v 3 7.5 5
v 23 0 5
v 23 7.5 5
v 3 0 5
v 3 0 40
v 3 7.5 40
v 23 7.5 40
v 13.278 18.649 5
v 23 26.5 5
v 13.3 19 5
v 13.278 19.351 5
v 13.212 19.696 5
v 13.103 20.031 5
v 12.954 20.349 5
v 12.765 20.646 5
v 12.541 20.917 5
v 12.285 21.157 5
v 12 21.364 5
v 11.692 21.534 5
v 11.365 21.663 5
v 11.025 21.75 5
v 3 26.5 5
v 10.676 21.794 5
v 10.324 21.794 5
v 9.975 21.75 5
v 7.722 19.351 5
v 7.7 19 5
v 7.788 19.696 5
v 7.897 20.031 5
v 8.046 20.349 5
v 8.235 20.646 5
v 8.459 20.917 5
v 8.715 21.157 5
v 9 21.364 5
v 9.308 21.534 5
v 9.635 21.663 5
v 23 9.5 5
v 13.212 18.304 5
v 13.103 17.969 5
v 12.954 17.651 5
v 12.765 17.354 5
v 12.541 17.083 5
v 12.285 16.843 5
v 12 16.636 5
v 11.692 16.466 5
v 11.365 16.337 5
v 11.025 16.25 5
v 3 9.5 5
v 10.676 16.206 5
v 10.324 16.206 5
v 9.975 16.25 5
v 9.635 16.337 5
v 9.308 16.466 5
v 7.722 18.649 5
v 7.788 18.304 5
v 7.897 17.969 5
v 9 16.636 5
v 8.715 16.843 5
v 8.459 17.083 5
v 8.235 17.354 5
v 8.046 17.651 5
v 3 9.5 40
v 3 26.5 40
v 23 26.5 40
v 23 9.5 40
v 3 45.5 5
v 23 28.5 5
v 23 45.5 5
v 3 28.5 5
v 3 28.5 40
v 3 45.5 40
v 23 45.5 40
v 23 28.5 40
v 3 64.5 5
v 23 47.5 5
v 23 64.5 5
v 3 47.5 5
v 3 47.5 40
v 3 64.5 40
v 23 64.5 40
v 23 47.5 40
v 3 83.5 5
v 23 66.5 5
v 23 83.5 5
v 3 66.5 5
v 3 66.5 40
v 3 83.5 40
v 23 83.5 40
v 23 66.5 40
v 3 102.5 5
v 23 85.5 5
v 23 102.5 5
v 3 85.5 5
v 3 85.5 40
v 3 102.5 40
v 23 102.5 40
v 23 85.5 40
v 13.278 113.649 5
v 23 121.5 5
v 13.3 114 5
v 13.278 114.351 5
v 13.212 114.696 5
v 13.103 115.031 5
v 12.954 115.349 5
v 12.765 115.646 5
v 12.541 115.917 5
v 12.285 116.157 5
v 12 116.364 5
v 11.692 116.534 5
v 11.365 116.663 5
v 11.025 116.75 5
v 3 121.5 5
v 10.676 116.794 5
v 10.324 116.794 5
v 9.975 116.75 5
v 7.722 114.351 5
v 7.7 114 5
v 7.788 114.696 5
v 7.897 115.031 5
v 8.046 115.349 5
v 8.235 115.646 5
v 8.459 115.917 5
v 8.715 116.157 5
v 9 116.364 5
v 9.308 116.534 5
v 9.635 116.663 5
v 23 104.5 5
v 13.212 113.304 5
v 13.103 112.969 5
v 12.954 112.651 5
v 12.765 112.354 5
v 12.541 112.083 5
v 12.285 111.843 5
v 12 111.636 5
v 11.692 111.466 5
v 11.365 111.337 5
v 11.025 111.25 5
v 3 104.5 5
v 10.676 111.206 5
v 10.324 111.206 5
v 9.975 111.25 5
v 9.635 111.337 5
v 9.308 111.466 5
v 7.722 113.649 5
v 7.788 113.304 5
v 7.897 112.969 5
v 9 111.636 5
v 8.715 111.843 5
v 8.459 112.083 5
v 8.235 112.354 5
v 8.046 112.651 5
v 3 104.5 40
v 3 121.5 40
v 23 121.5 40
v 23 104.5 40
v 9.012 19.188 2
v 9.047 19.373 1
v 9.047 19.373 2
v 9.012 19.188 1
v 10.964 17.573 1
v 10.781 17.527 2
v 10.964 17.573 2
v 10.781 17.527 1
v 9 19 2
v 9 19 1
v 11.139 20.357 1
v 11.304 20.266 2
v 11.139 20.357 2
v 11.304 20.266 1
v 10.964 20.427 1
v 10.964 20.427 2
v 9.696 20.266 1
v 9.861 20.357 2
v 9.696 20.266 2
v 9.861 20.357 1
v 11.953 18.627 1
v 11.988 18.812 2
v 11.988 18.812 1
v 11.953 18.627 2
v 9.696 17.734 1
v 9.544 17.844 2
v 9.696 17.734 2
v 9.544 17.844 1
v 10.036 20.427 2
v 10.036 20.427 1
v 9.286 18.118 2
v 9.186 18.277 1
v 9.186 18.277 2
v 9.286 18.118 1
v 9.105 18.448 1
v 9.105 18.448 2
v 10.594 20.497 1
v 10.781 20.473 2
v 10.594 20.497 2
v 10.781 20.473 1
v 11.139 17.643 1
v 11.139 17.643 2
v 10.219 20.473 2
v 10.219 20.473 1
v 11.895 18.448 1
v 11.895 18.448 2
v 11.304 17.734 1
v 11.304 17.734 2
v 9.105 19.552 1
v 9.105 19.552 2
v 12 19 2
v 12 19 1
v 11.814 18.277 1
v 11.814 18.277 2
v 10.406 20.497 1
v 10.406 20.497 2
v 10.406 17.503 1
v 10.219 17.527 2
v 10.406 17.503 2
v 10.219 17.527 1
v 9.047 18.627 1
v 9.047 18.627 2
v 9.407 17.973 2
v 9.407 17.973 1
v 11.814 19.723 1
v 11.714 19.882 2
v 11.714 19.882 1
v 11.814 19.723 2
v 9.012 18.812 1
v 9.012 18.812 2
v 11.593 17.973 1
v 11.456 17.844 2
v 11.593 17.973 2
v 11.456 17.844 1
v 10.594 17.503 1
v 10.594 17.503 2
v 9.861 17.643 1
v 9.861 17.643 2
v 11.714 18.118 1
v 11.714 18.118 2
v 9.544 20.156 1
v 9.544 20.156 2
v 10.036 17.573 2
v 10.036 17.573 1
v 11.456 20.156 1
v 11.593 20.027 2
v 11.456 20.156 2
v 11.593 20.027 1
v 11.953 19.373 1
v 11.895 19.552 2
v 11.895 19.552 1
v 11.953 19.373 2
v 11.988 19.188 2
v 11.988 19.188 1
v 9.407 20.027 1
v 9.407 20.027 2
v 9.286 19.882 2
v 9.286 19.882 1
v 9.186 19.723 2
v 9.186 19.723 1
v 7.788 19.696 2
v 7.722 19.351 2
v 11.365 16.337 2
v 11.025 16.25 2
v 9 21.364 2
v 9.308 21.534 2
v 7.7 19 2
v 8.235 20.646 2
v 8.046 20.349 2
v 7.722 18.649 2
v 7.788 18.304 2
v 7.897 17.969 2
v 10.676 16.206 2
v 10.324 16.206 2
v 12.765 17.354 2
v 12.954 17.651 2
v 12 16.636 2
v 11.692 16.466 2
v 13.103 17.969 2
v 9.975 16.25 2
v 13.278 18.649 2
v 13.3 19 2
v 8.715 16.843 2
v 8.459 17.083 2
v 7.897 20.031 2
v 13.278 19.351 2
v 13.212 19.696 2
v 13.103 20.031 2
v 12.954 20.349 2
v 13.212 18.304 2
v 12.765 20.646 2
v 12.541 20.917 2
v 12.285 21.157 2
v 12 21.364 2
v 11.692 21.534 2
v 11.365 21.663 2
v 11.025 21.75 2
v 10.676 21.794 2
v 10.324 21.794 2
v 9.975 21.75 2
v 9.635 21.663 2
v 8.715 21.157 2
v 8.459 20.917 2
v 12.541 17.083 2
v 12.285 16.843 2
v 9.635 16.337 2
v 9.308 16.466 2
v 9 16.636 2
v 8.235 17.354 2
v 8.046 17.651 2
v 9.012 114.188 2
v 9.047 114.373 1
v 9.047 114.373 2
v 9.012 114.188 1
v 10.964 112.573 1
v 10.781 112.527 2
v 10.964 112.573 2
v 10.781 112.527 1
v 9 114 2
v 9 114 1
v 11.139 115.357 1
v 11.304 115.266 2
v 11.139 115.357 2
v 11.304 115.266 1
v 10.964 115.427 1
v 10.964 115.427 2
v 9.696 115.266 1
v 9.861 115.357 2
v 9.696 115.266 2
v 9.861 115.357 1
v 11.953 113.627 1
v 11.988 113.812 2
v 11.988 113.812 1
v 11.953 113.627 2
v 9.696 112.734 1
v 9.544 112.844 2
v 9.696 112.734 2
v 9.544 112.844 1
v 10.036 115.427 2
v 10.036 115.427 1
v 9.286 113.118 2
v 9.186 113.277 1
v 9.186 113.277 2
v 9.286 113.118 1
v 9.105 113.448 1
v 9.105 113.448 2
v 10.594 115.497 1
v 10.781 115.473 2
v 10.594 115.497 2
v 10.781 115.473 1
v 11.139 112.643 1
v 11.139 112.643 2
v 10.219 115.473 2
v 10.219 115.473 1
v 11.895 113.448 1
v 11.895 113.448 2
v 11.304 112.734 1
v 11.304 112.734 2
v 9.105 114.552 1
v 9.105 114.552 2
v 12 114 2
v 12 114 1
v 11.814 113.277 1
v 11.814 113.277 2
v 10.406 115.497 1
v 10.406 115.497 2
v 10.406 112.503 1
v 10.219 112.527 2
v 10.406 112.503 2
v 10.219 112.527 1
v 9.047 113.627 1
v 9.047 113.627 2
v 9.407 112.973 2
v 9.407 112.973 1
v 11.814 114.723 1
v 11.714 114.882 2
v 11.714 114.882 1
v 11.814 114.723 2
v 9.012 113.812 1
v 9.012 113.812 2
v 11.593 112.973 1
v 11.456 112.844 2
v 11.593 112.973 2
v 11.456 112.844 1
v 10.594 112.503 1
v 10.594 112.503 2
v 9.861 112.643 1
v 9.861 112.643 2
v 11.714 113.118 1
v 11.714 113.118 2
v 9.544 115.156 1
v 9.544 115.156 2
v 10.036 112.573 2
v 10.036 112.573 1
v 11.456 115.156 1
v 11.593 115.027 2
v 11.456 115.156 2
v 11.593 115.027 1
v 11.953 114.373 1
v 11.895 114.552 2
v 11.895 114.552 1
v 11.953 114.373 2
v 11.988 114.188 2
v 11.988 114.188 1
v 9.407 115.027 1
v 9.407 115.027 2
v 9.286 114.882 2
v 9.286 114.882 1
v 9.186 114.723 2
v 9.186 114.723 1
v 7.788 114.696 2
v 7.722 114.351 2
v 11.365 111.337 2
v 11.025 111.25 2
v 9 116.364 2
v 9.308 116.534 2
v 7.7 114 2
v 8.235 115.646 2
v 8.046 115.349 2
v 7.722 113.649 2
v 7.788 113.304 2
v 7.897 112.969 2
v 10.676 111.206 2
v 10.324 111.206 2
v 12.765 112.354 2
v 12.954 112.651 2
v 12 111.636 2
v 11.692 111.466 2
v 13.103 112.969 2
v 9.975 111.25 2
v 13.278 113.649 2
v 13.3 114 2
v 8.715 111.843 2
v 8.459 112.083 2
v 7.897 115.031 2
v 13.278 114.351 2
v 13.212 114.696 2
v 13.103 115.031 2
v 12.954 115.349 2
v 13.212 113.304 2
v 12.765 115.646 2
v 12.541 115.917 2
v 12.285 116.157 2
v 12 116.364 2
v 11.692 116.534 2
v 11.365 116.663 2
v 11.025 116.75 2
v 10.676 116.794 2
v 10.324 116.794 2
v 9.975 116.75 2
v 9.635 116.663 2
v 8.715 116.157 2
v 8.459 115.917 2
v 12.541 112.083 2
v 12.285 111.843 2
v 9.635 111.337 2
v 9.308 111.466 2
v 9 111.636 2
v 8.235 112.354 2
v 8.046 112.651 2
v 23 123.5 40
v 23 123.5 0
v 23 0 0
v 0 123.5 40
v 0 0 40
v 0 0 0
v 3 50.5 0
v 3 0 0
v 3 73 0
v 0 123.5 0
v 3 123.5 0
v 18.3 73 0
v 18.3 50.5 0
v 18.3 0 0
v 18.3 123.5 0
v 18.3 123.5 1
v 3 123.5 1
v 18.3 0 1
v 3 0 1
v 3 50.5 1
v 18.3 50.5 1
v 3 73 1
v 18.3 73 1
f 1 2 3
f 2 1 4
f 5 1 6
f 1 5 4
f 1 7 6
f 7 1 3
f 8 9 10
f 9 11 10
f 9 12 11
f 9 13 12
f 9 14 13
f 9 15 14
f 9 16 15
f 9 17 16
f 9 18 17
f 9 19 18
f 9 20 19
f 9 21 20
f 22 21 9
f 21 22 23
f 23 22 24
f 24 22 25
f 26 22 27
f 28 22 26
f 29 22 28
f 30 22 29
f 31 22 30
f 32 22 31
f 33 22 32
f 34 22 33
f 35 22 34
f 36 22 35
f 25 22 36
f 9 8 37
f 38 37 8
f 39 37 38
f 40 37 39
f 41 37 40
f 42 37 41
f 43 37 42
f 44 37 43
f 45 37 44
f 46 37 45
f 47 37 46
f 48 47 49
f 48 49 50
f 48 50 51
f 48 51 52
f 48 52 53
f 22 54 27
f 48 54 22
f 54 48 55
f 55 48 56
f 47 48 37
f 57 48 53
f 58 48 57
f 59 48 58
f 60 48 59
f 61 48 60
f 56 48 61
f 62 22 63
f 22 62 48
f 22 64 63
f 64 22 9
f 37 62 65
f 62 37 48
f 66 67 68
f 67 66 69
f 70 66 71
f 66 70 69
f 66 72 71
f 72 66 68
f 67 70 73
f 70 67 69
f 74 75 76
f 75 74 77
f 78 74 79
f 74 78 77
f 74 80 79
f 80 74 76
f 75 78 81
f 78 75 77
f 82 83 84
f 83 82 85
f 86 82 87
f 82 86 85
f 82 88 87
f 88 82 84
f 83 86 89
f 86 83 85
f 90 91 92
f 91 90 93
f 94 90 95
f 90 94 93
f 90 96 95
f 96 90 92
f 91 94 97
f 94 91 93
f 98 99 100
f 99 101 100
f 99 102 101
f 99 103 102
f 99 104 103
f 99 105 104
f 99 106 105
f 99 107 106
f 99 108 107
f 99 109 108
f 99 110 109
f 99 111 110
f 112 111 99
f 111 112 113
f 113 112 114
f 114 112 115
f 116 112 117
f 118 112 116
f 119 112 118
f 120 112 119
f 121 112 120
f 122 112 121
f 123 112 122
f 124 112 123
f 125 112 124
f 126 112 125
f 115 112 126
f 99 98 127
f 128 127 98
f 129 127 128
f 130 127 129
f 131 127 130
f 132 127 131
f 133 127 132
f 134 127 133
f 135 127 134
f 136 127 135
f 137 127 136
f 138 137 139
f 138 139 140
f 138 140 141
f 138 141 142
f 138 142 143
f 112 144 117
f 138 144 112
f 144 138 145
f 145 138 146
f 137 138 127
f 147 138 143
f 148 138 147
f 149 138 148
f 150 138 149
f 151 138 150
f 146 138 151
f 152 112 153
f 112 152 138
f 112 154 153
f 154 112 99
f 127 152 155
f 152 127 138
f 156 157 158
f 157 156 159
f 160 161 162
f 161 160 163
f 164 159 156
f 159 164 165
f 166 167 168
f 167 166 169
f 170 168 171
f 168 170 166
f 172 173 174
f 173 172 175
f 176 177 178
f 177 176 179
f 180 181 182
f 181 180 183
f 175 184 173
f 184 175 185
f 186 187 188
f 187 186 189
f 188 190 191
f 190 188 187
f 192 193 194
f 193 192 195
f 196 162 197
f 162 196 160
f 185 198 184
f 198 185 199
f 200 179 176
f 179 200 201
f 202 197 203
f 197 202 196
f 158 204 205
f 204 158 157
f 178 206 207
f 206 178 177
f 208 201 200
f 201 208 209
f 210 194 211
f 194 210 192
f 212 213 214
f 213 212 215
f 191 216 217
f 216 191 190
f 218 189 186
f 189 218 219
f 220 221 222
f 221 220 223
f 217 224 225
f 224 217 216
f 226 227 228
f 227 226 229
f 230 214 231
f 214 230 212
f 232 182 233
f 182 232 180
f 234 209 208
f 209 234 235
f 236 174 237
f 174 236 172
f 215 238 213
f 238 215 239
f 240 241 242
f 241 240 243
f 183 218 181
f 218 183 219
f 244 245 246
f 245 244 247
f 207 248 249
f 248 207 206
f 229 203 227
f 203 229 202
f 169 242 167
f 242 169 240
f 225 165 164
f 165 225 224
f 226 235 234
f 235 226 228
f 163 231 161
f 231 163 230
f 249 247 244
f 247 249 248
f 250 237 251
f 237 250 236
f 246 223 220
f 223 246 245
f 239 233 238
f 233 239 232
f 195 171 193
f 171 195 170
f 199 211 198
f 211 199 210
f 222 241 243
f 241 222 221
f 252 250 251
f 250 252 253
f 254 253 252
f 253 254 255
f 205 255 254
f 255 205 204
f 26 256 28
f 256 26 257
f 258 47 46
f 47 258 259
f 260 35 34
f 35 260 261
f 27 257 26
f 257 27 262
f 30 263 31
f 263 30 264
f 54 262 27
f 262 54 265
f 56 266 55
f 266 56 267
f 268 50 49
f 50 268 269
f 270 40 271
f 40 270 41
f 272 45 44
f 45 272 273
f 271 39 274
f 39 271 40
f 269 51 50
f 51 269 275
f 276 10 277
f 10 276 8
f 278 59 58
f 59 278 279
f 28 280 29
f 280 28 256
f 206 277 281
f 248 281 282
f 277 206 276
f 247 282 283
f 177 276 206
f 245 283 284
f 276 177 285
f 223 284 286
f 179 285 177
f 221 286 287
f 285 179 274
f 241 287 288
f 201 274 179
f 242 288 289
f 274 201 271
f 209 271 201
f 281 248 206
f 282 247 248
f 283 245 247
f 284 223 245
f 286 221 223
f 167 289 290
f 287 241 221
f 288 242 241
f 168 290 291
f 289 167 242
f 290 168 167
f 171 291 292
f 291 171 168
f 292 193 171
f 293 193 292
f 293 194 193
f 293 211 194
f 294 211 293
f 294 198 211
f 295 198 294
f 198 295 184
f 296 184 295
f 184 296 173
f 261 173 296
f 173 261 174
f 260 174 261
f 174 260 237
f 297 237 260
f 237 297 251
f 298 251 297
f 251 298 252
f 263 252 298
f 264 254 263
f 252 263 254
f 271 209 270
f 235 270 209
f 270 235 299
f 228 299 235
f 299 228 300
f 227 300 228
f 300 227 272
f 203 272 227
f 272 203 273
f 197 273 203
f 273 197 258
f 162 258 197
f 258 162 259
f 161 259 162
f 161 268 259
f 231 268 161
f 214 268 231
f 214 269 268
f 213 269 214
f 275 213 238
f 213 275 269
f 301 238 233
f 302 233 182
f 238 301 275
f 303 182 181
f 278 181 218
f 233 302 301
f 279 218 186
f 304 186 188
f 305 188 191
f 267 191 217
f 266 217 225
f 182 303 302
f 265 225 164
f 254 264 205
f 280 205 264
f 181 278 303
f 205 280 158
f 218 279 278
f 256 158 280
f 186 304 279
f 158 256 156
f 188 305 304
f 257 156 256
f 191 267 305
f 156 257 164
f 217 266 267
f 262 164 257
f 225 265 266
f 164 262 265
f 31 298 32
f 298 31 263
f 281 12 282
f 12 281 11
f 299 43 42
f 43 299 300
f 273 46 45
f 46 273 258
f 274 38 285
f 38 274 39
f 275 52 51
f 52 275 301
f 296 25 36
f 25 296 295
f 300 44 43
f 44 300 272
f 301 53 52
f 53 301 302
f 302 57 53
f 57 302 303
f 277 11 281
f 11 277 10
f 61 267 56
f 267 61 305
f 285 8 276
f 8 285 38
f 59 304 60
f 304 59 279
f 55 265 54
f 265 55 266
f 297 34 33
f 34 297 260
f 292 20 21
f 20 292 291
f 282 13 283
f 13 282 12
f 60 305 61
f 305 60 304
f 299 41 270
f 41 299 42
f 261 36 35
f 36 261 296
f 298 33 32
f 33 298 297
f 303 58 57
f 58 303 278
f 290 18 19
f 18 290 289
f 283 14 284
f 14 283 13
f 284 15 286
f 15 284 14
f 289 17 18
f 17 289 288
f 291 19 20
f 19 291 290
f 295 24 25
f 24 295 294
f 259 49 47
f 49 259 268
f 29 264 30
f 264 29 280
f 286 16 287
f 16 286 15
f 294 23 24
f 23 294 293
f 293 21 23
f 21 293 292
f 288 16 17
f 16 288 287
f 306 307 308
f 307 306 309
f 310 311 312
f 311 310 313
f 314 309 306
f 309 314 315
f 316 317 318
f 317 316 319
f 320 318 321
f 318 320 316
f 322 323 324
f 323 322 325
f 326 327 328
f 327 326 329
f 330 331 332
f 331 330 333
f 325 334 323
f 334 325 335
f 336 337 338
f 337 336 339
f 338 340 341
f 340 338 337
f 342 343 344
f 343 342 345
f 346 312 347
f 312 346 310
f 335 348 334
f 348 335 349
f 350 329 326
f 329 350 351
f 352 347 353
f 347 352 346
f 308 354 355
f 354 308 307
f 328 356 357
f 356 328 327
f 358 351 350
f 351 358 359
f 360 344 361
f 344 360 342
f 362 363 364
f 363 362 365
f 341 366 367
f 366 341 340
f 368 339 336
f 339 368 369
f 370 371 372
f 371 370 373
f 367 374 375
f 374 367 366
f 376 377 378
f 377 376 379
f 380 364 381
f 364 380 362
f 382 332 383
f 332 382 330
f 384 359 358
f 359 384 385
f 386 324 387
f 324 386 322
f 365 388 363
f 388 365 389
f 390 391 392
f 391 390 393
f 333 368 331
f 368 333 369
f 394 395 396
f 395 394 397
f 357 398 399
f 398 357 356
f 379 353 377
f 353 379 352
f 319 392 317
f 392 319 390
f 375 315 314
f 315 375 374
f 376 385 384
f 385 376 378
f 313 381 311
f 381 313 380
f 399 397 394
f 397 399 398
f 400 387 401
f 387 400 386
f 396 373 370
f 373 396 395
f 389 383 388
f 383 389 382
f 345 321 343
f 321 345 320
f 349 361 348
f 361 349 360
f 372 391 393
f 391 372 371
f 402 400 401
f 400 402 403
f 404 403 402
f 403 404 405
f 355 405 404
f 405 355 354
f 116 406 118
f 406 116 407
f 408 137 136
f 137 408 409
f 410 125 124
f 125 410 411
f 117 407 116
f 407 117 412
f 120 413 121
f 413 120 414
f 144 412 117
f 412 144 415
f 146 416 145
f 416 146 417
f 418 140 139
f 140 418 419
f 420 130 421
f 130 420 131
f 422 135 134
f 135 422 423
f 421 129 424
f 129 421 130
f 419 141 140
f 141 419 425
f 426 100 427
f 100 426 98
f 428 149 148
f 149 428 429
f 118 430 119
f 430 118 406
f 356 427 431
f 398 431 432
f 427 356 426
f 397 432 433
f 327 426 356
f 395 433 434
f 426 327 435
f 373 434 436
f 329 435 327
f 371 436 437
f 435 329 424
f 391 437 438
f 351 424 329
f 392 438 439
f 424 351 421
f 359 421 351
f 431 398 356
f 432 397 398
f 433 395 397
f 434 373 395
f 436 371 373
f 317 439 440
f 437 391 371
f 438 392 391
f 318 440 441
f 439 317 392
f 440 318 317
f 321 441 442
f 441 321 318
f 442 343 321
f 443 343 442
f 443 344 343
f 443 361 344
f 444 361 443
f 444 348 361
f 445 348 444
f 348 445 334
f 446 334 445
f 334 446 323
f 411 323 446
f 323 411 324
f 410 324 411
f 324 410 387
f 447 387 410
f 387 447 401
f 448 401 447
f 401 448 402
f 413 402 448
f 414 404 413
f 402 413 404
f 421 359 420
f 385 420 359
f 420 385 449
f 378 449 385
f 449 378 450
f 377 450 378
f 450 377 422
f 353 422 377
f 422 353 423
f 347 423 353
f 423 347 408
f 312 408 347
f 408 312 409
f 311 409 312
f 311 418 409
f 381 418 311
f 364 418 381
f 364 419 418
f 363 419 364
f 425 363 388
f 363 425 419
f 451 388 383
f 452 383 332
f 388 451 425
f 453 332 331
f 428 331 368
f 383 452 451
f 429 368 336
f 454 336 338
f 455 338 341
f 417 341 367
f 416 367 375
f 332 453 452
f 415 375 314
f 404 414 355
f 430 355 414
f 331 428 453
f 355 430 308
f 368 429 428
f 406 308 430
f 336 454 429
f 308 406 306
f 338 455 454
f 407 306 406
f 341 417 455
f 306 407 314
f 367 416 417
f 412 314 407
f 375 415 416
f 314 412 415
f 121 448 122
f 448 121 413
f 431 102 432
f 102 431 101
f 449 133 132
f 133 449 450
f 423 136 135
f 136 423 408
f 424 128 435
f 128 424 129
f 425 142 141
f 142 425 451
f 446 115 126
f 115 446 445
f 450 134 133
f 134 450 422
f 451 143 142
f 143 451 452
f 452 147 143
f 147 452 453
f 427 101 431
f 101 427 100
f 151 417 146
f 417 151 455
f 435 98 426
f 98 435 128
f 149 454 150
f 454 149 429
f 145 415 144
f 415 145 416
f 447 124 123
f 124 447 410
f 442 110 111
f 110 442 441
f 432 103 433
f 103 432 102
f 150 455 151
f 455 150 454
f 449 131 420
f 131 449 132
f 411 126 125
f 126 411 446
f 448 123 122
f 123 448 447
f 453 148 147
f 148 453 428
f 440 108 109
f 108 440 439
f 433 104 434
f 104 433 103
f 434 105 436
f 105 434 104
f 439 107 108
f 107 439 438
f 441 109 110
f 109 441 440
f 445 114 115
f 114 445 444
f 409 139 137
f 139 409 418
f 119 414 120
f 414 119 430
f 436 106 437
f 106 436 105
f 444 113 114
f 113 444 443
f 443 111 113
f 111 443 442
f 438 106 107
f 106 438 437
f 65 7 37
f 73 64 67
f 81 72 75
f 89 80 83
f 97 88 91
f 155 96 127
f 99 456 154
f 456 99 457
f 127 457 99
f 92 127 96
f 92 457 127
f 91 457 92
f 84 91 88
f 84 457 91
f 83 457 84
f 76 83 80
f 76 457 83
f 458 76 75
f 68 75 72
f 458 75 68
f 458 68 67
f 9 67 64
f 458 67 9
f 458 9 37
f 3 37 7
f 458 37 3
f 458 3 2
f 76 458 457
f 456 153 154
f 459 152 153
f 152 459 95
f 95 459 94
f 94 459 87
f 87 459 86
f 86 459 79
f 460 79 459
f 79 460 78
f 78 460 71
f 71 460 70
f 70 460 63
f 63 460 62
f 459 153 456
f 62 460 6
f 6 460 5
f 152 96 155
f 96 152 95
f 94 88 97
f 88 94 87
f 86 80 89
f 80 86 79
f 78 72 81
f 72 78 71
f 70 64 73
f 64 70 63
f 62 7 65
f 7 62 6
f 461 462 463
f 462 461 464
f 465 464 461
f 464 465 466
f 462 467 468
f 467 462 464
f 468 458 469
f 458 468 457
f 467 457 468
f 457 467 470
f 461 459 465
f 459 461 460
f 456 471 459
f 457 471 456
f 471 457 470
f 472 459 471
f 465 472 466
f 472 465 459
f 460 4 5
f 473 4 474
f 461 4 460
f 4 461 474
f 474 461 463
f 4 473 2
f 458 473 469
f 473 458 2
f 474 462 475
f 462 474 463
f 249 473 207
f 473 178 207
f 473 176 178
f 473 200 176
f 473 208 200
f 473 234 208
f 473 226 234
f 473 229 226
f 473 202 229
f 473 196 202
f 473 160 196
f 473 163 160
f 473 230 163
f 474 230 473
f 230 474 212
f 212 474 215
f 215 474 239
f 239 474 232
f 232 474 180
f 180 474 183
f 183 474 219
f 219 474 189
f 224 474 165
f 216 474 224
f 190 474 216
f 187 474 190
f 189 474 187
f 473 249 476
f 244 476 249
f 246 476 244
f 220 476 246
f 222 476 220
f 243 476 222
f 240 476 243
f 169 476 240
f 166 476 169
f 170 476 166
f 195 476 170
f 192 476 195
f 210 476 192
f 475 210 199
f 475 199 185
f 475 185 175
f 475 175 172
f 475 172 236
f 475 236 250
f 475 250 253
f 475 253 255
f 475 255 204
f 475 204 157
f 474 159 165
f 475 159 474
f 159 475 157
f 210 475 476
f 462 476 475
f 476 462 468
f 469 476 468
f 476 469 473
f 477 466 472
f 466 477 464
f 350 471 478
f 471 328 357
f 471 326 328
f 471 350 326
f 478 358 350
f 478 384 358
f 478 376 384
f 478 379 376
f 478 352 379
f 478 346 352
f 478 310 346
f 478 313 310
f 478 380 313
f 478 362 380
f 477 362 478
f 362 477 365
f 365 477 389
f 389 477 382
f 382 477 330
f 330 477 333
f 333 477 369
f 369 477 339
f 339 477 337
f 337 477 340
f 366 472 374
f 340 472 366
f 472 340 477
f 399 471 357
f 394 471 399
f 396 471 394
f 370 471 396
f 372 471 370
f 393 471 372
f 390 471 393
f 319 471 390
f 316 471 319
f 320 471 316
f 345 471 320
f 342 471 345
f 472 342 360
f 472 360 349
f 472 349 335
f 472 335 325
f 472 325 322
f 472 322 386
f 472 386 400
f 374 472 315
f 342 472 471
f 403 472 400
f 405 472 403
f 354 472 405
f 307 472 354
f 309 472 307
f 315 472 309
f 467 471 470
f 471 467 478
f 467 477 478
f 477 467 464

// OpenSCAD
// Cassette Frame
// by Nathan Wittstock <nate@fardog.io>

// preview[view: south east, tilt: top diagonal]

/* [Component] */
component = "frame"; //["tongue", "frame"]
is_end = true;

/* [Cassette] */
number_of_cassettes = 7; //[5:15]
x_tolerance_mm = 1.5; //[1.0:3.0]
y_tolerance_mm = 1.0; //[1.0:3.0]

/* [Tower] */
// spacing between cassette cutouts
cassette_spacing_mm = 2; //[1:5]
// depth of cassette inserts
depth_mm = 35; //[10:50]
// width of the cassette cutouts
width_mm = 20; //[10:50]
// width of frame
frame_width_mm = 3; //[2:10]
// minimum depth of frame backing; the total will be this plus the tongue width
frame_depth_min_mm = 4; //[1:3]
// thickness of the tongue that will attach halves, or the feet
tongue_thickness_mm = 5; //[1:3]
// length of the tongue that will attach halves, or have feet on the end
tongue_length_mm = 60;
tongue_width_mm = 15;
tongue_inset_mm = 1;
// distance from the edge of the tongue that the screw cutout should be
tongue_screw_edge_mm = 3;
tongue_screw_nut_d_mm = 5.6;
tongue_screw_head_d_mm = 5.6;
tongue_screw_head_depth_mm = 3;
tongue_screw_d_mm = 3;
tongue_tolerance_mm = 0.3;
tongue_foot_height_mm = 10;
tongue_foot_thickness_mm = 5;

/* [Cassette Cases] */
case_width_mm = 109.0;
case_height_mm = 17.0;
case_depth_mm = 70.0;

/* [Hidden] */
case_total_height = case_height_mm + y_tolerance_mm + cassette_spacing_mm/2;
shift = case_total_height / 2;
total_height = (case_total_height * number_of_cassettes) - (is_end ? shift : case_total_height);
total_width = width_mm + frame_width_mm;
frame_depth = tongue_inset_mm + frame_depth_min_mm;
total_depth = depth_mm + frame_depth;

$fn=50;

echo(total_height);

module frame_solid() {
    cube([total_width, total_height, total_depth]);
}

module cassettes() {
    for (i = [0:number_of_cassettes -1]) {
        current_y = case_total_height * i;
        translate([0, current_y, 0])
            cube([case_width_mm, case_height_mm, case_depth_mm]);
    }
}

module screw_inset() {
    translate([0, 0, frame_depth]) rotate([0, 180, 0]) union() {
        linear_extrude(frame_depth) circle(d=tongue_screw_d_mm);
        linear_extrude(tongue_screw_head_depth_mm) circle(d=tongue_screw_head_d_mm);
    }
}

module frame() {
    difference() {
        frame_solid();
        translate([frame_width_mm, -shift, frame_depth])
            cassettes();
        // tongue cutouts
        translate([frame_width_mm, -shift, 0])
            linear_extrude(tongue_inset_mm) tongue_profile(tongue_tolerance_mm);
        translate([frame_width_mm, total_height-tongue_length_mm+shift, 0])
            linear_extrude(tongue_inset_mm) tongue_profile(tongue_tolerance_mm);
        // screw insets
        translate([frame_width_mm+tongue_width_mm/2, case_total_height])
            screw_inset();
        translate([frame_width_mm+tongue_width_mm/2, case_total_height*(number_of_cassettes-1)])
            screw_inset();
    }
}

module cutout_profile(vec) {
    d = vec[0];
    l = vec[1];
    union() {
        translate([0, d/2, 0])
            circle(d=d);
        translate([0, l-d/2, 0])
            circle(d=d);
        translate([-d/2, d/2, 0])
            square([d, l-d]);
    }
}

module cutout() {
    union() {
        translate([0, tongue_screw_edge_mm, 0])
        linear_extrude(tongue_screw_head_depth_mm)
            cutout_profile([tongue_screw_nut_d_mm, tongue_length_mm - tongue_screw_edge_mm*2]);
        translate([0, tongue_screw_edge_mm, 0])
        linear_extrude(tongue_thickness_mm)
            cutout_profile([tongue_screw_d_mm, tongue_length_mm - tongue_screw_edge_mm*2]);
    }
}

module tongue_profile(tol_mm=0) {
    square([tongue_width_mm+tol_mm, tongue_length_mm]);
}

module tongue() {
    difference() {
        linear_extrude(tongue_thickness_mm) tongue_profile();
        translate([tongue_width_mm/2, 0, 0]) cutout();
    }
}

if (component == "frame") {
    frame();
} else if (component == "tongue") {
    union() {
        tongue();
        if (is_end) {
            translate([0, tongue_length_mm, 0])
                linear_extrude(tongue_foot_height_mm)
                    square([tongue_width_mm, tongue_foot_thickness_mm]);
        }
    }
} else {
    assert(false, "incorrect component setting");
}
